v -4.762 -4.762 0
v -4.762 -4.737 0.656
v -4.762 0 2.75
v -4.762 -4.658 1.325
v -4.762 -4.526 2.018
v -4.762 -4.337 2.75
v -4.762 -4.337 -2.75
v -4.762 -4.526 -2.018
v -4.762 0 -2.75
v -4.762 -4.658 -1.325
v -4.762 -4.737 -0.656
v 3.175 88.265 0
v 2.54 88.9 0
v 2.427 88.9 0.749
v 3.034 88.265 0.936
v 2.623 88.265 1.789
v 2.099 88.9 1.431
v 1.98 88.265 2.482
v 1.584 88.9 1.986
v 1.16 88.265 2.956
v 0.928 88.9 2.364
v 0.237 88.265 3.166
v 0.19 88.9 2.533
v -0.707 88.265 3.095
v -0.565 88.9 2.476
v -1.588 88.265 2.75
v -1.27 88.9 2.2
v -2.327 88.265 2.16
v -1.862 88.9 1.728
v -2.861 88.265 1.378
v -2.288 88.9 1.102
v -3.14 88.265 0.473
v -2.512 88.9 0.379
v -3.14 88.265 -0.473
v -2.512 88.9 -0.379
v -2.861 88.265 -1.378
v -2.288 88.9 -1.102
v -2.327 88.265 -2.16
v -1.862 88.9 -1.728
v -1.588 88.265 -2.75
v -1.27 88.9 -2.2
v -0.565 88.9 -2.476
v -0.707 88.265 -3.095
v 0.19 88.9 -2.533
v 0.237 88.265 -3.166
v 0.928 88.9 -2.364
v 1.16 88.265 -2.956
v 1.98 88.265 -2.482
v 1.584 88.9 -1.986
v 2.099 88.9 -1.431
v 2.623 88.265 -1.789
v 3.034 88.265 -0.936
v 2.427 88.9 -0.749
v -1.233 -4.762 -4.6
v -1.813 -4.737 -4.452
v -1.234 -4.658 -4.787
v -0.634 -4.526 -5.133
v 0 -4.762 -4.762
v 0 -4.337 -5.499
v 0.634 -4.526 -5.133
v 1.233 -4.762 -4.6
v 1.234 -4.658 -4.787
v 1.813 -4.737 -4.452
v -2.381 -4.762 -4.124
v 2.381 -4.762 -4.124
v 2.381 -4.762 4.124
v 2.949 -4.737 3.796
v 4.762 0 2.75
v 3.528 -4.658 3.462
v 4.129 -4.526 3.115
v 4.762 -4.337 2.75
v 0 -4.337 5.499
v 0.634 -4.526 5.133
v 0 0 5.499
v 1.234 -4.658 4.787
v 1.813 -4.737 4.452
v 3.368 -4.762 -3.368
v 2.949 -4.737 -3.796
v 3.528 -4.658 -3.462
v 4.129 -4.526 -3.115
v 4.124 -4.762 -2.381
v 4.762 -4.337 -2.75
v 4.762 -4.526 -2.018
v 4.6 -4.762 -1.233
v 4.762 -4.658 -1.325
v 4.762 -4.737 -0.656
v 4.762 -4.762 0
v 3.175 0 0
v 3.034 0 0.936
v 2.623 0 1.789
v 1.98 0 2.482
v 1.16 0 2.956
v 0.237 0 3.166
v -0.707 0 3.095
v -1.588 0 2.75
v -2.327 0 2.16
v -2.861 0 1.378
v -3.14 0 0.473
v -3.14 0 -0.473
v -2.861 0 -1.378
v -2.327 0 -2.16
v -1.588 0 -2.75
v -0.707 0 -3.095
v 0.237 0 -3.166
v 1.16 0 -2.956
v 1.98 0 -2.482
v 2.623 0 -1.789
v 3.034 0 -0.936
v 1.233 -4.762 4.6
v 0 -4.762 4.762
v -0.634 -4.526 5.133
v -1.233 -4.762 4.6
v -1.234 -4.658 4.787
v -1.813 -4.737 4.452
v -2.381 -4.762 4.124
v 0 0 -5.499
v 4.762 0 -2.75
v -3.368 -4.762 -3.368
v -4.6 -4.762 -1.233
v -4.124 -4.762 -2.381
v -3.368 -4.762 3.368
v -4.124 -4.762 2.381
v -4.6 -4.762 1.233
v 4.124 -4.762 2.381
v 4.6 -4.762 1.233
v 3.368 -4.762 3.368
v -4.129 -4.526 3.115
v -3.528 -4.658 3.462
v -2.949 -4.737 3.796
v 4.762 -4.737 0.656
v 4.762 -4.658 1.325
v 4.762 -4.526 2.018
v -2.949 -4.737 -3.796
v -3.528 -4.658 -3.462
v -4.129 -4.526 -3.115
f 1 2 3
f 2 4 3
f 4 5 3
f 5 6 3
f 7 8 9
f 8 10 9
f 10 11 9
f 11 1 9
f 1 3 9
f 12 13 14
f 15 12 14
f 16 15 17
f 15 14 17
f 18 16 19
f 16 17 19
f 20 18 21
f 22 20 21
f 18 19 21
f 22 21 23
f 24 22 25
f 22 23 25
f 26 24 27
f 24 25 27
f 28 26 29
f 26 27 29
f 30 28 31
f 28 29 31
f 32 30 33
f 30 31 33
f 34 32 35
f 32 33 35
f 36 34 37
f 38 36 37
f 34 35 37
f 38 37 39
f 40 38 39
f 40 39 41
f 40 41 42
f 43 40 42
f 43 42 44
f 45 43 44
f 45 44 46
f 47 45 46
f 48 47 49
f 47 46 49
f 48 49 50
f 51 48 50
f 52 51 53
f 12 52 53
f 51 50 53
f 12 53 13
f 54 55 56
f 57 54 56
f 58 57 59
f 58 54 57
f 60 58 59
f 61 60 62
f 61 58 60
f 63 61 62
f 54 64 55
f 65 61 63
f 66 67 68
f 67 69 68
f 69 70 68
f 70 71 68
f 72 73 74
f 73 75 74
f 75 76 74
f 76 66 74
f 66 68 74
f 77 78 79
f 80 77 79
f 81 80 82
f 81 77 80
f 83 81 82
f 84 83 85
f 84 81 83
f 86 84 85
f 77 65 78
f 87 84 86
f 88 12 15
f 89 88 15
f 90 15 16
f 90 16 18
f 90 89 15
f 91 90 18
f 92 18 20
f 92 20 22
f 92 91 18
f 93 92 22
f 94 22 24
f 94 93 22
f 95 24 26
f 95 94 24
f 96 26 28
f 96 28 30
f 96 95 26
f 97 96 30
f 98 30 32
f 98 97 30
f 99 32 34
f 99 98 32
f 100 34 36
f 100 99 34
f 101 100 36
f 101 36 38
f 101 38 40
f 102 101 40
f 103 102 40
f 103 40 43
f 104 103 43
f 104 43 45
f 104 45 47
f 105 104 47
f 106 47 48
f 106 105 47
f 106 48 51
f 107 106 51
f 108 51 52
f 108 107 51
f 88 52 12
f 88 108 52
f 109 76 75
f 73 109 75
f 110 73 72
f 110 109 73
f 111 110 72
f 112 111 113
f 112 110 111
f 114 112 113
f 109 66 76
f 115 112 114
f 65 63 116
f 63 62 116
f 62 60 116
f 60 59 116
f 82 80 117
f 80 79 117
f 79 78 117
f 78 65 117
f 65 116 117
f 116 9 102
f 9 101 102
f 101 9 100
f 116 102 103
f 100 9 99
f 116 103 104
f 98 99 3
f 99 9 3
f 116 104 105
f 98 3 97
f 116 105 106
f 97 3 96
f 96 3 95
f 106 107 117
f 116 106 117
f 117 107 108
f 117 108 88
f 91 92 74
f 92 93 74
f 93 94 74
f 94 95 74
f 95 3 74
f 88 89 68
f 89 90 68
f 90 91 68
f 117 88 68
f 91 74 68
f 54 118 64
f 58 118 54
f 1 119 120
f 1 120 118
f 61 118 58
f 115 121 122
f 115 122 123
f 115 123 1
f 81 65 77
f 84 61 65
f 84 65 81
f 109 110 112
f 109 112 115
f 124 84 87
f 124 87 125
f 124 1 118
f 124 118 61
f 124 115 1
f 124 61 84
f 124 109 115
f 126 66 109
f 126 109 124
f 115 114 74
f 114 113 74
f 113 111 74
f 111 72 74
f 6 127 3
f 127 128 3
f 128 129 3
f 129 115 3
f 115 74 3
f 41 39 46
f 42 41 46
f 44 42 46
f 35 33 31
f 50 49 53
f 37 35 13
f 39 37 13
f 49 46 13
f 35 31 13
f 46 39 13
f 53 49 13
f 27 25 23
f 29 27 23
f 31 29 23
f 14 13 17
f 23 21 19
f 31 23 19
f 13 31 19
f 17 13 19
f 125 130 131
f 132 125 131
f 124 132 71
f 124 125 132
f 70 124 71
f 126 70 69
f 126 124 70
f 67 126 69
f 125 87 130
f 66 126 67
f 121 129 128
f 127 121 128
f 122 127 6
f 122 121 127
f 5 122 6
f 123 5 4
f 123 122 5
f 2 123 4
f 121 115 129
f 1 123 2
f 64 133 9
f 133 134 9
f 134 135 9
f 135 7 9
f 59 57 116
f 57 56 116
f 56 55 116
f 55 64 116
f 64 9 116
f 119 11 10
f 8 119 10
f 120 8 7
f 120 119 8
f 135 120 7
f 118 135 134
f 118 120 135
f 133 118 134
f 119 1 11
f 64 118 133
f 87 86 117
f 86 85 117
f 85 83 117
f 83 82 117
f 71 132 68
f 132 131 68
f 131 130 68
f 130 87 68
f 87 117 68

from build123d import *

# Parameters (mm, degrees)
F2_R     = 3.175
F3_DEPTH = 88.9
F5_DEPTH = 4.7625
F6_SIZE  = 0.635


# Not quite as in the source:
# - a length typed as a fraction of an inch, garbled in the dataset ("3 / 203.2 mm" for 3/8 in), is restored


with BuildPart() as f3:
    # F2 (on Front) → F3 (new body)
    with BuildSketch(Plane.XZ):
        Circle(F2_R)
    extrude(amount=-F3_DEPTH)

    # F4 (on Front) → F5 (join)
    with BuildSketch(Plane.XZ):
        Polygon((0, -5.499261314), (4.7625, -2.749630657), (4.7625, 2.749630657), (0, 5.499261314), (-4.7625, 2.749630657), (-4.7625, -2.749630657), align=None)
    extrude(amount=F5_DEPTH)

    # F6
    f6_edges = [f3.edges().sort_by_distance(p)[0] for p in [
        (-3.175, 88.9, 0),
    ]]
    chamfer(f6_edges, length=F6_SIZE)

    # F7 (on Top) → F8 (revolve, cut)
    with BuildSketch(Plane.XY):
        Polygon((11.8464599431, -4.7625), (11.8464599431, -0.6725738199), (4.7625, -4.7625), align=None)
    revolve(axis=Axis((0, -2.38125, 0), (0, -1, 0)), mode=Mode.SUBTRACT)


solid = f3.part
